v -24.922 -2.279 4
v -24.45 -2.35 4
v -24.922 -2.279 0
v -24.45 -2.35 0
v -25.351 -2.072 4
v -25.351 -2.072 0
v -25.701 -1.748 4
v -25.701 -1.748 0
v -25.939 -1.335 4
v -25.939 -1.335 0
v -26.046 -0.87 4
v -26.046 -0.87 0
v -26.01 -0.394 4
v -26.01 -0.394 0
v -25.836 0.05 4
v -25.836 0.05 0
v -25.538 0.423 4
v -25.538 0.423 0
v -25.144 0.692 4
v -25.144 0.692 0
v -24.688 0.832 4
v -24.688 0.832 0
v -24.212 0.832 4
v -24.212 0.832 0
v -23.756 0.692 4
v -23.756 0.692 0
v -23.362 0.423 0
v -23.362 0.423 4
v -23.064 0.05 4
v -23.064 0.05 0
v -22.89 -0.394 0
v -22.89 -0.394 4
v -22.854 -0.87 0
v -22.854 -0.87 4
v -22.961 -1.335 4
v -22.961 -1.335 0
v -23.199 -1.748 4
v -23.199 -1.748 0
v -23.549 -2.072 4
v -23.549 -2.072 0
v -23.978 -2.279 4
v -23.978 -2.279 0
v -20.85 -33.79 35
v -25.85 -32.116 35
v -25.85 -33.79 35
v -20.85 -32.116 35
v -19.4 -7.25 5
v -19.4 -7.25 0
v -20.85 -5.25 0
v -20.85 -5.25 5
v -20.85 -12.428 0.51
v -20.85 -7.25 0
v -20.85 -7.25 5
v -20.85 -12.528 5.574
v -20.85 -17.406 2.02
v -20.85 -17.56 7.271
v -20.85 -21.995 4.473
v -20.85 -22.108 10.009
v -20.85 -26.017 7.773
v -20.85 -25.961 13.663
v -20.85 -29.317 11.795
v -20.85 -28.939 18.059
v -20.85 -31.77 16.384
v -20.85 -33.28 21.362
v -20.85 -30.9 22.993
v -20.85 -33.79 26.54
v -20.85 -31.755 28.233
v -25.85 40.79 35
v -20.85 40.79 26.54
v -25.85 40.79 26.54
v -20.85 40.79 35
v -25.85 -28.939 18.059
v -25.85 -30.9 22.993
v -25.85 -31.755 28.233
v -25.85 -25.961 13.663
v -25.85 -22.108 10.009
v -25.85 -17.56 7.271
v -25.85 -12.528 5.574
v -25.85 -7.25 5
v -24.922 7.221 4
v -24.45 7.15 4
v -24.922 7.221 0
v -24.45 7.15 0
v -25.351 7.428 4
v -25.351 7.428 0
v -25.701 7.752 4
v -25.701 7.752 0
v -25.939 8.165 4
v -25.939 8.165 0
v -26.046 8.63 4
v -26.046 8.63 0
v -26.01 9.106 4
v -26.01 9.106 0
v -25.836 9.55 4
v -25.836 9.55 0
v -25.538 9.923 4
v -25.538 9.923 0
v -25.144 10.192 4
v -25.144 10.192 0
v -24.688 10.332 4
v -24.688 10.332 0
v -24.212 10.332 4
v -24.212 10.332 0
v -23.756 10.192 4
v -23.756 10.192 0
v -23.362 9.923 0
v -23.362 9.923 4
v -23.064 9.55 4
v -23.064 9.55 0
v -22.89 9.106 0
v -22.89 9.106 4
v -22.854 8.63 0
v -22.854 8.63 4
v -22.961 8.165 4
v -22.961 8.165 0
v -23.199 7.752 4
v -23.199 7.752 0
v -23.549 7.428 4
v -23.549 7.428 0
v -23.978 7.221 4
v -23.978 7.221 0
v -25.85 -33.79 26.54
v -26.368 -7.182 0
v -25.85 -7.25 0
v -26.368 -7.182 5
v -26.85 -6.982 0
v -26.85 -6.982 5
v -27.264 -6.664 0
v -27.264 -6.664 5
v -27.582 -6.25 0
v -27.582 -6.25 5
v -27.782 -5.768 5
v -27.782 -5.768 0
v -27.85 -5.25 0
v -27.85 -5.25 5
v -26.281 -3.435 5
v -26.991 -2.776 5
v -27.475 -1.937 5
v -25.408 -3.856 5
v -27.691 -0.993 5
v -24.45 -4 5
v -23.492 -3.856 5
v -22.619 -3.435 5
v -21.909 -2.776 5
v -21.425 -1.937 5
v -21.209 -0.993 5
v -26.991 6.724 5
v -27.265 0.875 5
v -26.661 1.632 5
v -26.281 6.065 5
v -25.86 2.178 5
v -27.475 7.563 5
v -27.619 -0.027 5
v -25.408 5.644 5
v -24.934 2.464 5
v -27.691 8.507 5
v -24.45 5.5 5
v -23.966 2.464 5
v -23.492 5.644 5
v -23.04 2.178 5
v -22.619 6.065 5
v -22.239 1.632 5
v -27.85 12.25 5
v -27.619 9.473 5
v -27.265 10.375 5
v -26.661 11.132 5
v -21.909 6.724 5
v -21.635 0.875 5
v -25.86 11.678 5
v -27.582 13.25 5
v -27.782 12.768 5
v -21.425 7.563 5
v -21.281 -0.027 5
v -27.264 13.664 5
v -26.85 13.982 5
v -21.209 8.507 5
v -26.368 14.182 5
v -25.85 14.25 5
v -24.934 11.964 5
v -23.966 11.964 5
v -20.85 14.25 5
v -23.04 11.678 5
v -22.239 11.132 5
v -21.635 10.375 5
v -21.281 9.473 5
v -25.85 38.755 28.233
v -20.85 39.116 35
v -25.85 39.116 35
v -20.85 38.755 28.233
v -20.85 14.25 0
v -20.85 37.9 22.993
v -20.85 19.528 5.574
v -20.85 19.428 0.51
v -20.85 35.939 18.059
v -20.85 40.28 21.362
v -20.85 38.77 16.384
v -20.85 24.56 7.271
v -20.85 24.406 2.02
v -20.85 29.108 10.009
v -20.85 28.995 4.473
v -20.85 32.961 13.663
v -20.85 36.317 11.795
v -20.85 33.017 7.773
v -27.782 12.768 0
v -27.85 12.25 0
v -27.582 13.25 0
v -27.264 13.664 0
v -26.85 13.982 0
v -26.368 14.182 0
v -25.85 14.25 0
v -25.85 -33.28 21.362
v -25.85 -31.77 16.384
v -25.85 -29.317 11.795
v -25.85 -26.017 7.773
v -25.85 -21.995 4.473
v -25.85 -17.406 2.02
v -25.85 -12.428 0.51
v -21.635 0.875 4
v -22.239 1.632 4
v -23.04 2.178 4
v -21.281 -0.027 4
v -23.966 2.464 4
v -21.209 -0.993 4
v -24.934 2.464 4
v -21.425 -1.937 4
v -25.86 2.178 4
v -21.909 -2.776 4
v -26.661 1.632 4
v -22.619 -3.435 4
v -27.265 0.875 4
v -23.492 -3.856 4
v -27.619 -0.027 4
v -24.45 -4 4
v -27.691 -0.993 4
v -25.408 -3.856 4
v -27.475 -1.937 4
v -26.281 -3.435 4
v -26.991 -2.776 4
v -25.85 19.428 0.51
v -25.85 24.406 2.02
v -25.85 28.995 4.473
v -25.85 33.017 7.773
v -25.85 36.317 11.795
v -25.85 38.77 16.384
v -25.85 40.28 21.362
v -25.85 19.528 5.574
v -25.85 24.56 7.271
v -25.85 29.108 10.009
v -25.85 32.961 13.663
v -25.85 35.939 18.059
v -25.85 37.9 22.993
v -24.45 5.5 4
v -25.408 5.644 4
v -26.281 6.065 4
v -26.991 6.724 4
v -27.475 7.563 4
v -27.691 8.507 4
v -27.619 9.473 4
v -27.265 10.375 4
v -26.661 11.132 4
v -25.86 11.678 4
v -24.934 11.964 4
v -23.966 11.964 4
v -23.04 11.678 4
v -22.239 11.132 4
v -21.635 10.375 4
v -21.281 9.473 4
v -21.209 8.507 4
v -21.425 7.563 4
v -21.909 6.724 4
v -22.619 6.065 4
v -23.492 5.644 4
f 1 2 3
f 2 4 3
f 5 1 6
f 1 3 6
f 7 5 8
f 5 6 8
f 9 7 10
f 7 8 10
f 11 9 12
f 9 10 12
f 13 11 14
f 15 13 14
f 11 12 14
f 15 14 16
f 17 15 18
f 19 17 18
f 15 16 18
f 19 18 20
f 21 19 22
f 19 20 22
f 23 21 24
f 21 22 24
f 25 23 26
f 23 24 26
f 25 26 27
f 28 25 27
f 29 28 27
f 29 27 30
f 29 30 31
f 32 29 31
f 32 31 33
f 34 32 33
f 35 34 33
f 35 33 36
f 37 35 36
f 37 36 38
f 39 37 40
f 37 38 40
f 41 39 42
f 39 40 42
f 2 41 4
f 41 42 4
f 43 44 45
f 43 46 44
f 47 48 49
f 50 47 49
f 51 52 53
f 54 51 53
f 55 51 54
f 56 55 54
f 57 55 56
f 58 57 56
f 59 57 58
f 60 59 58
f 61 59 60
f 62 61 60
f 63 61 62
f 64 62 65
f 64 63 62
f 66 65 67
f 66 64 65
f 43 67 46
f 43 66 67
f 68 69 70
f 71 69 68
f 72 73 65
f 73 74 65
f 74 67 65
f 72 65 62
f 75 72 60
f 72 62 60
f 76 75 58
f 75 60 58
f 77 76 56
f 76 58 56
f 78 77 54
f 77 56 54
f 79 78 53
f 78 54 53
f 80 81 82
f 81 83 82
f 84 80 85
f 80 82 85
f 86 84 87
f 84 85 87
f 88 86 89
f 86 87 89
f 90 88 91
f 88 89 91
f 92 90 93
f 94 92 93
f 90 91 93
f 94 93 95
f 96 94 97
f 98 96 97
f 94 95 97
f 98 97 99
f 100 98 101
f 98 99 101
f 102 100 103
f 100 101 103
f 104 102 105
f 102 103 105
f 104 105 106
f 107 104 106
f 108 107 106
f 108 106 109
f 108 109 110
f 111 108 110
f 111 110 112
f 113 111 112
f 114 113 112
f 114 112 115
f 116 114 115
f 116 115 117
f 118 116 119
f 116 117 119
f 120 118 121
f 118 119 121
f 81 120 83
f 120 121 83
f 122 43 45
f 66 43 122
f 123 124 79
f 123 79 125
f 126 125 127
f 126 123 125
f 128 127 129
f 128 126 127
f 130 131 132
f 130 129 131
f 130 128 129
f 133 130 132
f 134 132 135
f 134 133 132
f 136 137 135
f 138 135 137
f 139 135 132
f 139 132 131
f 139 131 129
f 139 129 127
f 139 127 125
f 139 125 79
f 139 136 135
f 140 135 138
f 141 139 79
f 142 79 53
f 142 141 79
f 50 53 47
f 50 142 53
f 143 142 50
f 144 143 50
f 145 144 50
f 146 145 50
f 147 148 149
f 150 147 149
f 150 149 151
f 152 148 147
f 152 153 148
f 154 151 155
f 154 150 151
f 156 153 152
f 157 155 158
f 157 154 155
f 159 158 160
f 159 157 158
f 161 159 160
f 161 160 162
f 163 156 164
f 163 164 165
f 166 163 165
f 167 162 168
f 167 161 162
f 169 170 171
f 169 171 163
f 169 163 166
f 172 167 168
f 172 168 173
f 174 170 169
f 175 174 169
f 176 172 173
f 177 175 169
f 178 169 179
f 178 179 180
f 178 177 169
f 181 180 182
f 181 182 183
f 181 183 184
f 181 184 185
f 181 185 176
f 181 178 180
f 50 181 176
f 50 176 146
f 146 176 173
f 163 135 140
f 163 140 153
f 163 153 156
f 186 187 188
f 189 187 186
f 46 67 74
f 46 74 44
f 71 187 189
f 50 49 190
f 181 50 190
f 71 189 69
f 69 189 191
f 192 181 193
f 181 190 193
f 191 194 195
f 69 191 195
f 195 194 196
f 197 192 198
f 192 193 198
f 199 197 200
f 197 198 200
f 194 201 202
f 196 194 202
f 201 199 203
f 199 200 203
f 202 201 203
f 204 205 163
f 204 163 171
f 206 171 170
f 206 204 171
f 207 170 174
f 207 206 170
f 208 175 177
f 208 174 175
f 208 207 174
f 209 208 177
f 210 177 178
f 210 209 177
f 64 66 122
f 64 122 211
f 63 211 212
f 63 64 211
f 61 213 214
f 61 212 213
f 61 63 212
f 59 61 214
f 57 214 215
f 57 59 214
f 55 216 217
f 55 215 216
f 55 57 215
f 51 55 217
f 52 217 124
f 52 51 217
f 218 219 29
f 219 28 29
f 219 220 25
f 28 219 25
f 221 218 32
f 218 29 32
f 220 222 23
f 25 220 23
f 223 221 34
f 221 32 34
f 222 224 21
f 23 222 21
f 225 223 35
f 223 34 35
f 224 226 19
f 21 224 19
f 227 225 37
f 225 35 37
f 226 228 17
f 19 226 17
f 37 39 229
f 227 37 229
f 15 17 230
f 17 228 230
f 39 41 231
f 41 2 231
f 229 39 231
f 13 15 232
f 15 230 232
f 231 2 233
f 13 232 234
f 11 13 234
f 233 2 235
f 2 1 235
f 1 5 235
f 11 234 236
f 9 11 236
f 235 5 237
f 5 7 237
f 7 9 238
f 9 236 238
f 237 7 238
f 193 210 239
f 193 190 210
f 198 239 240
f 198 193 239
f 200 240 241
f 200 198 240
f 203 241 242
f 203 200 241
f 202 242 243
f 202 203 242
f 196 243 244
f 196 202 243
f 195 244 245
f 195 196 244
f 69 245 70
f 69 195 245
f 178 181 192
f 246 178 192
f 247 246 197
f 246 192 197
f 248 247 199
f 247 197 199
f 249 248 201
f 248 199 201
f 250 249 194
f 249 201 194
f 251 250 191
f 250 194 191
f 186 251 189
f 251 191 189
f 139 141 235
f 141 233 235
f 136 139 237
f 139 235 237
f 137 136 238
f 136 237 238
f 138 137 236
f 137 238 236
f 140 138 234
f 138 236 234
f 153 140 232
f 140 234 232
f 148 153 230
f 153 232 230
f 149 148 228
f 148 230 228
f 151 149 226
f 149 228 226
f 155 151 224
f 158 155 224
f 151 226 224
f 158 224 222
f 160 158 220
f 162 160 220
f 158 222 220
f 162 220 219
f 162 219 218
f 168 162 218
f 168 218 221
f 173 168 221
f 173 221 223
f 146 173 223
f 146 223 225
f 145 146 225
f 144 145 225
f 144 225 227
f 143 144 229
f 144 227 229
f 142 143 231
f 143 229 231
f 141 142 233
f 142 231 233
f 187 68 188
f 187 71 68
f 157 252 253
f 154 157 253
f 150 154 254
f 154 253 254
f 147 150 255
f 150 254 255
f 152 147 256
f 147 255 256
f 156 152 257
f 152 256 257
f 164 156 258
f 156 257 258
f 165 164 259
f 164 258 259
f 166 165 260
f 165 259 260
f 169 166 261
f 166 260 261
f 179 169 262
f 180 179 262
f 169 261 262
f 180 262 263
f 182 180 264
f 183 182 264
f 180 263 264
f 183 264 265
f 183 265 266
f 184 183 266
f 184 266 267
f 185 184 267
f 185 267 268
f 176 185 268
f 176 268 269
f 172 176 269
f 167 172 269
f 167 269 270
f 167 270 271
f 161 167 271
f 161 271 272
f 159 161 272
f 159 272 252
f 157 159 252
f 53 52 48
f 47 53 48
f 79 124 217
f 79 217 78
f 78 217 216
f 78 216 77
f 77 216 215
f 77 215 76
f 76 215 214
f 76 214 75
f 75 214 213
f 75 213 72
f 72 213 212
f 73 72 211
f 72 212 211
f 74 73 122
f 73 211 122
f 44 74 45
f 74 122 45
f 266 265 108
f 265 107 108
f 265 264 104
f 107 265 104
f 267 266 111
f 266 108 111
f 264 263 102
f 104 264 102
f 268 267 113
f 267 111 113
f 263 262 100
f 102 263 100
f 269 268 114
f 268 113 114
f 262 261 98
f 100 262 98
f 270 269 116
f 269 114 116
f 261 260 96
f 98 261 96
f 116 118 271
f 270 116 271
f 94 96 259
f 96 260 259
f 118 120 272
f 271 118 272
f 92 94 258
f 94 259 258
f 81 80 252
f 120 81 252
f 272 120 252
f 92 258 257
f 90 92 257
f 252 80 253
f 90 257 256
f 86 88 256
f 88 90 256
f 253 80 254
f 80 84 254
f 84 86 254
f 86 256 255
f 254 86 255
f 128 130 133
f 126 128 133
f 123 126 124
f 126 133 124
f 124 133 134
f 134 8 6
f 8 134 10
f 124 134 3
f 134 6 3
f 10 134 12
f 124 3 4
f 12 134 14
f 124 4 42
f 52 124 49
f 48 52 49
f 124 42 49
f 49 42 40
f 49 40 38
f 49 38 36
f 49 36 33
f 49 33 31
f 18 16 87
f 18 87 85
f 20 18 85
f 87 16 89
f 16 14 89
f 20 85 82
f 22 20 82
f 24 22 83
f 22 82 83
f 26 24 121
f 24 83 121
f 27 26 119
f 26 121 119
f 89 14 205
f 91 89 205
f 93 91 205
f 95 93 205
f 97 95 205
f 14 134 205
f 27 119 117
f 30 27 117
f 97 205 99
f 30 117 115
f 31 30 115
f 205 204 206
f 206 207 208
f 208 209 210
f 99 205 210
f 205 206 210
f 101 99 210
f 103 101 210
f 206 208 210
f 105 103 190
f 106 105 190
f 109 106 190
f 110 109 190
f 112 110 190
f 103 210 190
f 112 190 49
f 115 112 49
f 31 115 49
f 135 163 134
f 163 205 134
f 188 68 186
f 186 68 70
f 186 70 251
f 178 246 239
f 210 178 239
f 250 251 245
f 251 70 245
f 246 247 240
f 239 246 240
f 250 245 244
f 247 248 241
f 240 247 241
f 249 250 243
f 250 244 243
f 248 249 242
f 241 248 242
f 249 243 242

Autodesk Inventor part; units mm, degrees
ref_plane "YZ Plane" through (0, 0, 0) normal (1, 0, 0) x (0, 1, 0)
ref_plane "XZ Plane" through (0, 0, 0) normal (0, 1, 0) x (-1, 0, 0)
ref_plane "XY Plane" through (0, 0, 0) normal (0, 0, 1) x (1, 0, 0)
ref_plane "Work Plane1" through (0, 0.5, 0) normal (0, 0, 1) x (1, 0, 0)
sketch "Sketch1" plane through (0, 0.5, 0) normal (0, 0, 1) x (1, 0, 0)
  arc A0 (-25.85, 13.75) -> (-27.85, 11.75) centre (-25.85, 11.75) ccw
  line L0 (-27.85, 11.75) -> (-27.85, -5.75)
  arc A1 (-27.85, -5.75) -> (-25.85, -7.75) centre (-25.85, -5.75) ccw
  line L1 (-25.85, -7.75) -> (-19.4, -7.75)
  arc A2 (-17.4, -9.75) -> (-19.4, -7.75) centre (-19.4, -9.75) ccw
  line L2 (-17.4, -9.75) -> (-17.4, -12.466667)
  arc A3 (-17.4, -12.466667) -> (-15.4, -14.466667) centre (-15.4, -12.466667) ccw
  line L3 (-15.4, -14.466667) -> (1.1, -14.466667)
  arc A4 (1.1, -14.466667) -> (3.1, -12.466667) centre (1.1, -12.466667) ccw
  line L4 (3.1, -12.466667) -> (3.1, -9.75)
  arc A5 (5.1, -7.75) -> (3.1, -9.75) centre (5.1, -9.75) ccw
  line L5 (5.1, -7.75) -> (24.95, -7.75)
  arc A6 (24.95, -7.75) -> (26.95, -5.75) centre (24.95, -5.75) ccw
  line L6 (26.95, -5.75) -> (26.95, 11.941667)
  arc A7 (26.95, 11.941667) -> (24.95, 13.941667) centre (24.95, 11.941667) ccw
  line L7 (24.95, 13.941667) -> (19.95, 13.941667)
  line L8 (19.95, 13.941667) -> (19.95, -5.75)
  line L9 (19.95, -5.75) -> (1.6, -5.75)
  line L10 (1.6, -5.75) -> (1.1, -12.466667)
  line L11 (1.1, -12.466667) -> (-13.9, -12.75)
  line L12 (-15.4, -12.75) -> (-15.4, -5.75)
  line L13 (-15.4, -5.75) -> (-20.85, -5.75)
  line L14 (-20.85, -5.75) -> (-20.85, 13.75)
  line L15 (-20.85, 13.75) -> (-25.85, 13.75)
  circle A8 centre (23.55, -1.25) radius 1.25
  circle A9 centre (-24.45, -1.25) radius 1.25
  circle A10 centre (-24.45, 8.25) radius 1.25
  circle A11 centre (23.55, 8.25) radius 1.25
  line L16 (-20.4, -5.75) -> (-20.4, -7.75)
  line L17 (-13.9, -12.75) -> (-15.4, -12.75)
  point P0 (0, -0.5)
sketch "Sketch1 outline for Extrusion1" plane through (0, 0.5, 0) normal (0, 0, 1) x (1, 0, 0)
  line L0 (-20.85, -5.75) -> (-20.85, 13.75)
  line L1 (-19.4, -7.75) -> (-20.85, -5.75)
  line L2 (-20.85, 13.75) -> (-25.85, 13.75)
  line L3 (-25.85, -7.75) -> (-19.4, -7.75)
  arc A0 (-25.85, 13.75) -> (-27.85, 11.75) centre (-25.85, 11.75) ccw
  arc A1 (-27.85, -5.75) -> (-25.85, -7.75) centre (-25.85, -5.75) ccw
  line L4 (-27.85, 11.75) -> (-27.85, -5.75)
  circle A2 centre (-24.45, -1.25) radius 1.25
  circle A3 centre (-24.45, 8.25) radius 1.25
extrude "Extrusion1" add sketch "Sketch1 outline for Extrusion1" along normal blind 5
ref_plane "Work Plane2" through (-25.85, 3.5, 0) normal (0, -1, 0) x (1, 0, 0)
sketch "Sketch3" plane through (-20.85, -7.25, 0) normal (1, 0, 0) x (0, 0, -1)
  line L0 (0, 19.5) -> (-5, 19.5)
  line L1 (0, 21.5) -> (-5, 21.5)
  line L2 (0, 21.5) -> (0, 19.5)
  arc A0 (0, 21.5) -> (-26.539944, 48.039944) centre (-26.539944, 21.5) ccw
  line L3 (-26.539944, 48.039944) -> (-35, 48.039944)
  line L4 (-35, 48.039944) -> (-35, 46.366043)
  line L5 (-35, 46.366043) -> (-28.232934, 46.005114)
  arc A1 (-5, 21.5) -> (-28.232934, 46.005114) centre (-29.539944, 21.5) ccw
  line L6 (-5, 2) -> (-5, 21.5)
  line L7 (0, 2) -> (0, 21.5)
  point P0 (0, 7.25)
  point P1 (-5, 0)
  point P2 (0, 0)
  dimension "d9" = 3
  dimension "d12" = 35
extrude "Extrusion2" add sketch "Sketch3" against normal blind 5 contours L1 A1 L5 L4 L3 A0
sketch "Sketch2" plane through (0, 0.5, 5) normal (0, 0, 1) x (1, 0, 0)
  circle A0 centre (-24.45, -1.25) radius 1.25 projected
  circle A1 centre (-24.45, 8.25) radius 1.25 projected
  point P0 (0, -0.5)
hole "Hole1" at (-24.45, -0.75, 5) at (-24.45, 8.75, 5) direction (0, 0, -1) diameter 3.2 end through all counterbore diameter 6.5 counterbore depth 1
mirror "Mirror1" about plane through (-25.85, 3.5, 0) normal (0, -1, 0) of "Extrusion2"
properties part number "leg"
